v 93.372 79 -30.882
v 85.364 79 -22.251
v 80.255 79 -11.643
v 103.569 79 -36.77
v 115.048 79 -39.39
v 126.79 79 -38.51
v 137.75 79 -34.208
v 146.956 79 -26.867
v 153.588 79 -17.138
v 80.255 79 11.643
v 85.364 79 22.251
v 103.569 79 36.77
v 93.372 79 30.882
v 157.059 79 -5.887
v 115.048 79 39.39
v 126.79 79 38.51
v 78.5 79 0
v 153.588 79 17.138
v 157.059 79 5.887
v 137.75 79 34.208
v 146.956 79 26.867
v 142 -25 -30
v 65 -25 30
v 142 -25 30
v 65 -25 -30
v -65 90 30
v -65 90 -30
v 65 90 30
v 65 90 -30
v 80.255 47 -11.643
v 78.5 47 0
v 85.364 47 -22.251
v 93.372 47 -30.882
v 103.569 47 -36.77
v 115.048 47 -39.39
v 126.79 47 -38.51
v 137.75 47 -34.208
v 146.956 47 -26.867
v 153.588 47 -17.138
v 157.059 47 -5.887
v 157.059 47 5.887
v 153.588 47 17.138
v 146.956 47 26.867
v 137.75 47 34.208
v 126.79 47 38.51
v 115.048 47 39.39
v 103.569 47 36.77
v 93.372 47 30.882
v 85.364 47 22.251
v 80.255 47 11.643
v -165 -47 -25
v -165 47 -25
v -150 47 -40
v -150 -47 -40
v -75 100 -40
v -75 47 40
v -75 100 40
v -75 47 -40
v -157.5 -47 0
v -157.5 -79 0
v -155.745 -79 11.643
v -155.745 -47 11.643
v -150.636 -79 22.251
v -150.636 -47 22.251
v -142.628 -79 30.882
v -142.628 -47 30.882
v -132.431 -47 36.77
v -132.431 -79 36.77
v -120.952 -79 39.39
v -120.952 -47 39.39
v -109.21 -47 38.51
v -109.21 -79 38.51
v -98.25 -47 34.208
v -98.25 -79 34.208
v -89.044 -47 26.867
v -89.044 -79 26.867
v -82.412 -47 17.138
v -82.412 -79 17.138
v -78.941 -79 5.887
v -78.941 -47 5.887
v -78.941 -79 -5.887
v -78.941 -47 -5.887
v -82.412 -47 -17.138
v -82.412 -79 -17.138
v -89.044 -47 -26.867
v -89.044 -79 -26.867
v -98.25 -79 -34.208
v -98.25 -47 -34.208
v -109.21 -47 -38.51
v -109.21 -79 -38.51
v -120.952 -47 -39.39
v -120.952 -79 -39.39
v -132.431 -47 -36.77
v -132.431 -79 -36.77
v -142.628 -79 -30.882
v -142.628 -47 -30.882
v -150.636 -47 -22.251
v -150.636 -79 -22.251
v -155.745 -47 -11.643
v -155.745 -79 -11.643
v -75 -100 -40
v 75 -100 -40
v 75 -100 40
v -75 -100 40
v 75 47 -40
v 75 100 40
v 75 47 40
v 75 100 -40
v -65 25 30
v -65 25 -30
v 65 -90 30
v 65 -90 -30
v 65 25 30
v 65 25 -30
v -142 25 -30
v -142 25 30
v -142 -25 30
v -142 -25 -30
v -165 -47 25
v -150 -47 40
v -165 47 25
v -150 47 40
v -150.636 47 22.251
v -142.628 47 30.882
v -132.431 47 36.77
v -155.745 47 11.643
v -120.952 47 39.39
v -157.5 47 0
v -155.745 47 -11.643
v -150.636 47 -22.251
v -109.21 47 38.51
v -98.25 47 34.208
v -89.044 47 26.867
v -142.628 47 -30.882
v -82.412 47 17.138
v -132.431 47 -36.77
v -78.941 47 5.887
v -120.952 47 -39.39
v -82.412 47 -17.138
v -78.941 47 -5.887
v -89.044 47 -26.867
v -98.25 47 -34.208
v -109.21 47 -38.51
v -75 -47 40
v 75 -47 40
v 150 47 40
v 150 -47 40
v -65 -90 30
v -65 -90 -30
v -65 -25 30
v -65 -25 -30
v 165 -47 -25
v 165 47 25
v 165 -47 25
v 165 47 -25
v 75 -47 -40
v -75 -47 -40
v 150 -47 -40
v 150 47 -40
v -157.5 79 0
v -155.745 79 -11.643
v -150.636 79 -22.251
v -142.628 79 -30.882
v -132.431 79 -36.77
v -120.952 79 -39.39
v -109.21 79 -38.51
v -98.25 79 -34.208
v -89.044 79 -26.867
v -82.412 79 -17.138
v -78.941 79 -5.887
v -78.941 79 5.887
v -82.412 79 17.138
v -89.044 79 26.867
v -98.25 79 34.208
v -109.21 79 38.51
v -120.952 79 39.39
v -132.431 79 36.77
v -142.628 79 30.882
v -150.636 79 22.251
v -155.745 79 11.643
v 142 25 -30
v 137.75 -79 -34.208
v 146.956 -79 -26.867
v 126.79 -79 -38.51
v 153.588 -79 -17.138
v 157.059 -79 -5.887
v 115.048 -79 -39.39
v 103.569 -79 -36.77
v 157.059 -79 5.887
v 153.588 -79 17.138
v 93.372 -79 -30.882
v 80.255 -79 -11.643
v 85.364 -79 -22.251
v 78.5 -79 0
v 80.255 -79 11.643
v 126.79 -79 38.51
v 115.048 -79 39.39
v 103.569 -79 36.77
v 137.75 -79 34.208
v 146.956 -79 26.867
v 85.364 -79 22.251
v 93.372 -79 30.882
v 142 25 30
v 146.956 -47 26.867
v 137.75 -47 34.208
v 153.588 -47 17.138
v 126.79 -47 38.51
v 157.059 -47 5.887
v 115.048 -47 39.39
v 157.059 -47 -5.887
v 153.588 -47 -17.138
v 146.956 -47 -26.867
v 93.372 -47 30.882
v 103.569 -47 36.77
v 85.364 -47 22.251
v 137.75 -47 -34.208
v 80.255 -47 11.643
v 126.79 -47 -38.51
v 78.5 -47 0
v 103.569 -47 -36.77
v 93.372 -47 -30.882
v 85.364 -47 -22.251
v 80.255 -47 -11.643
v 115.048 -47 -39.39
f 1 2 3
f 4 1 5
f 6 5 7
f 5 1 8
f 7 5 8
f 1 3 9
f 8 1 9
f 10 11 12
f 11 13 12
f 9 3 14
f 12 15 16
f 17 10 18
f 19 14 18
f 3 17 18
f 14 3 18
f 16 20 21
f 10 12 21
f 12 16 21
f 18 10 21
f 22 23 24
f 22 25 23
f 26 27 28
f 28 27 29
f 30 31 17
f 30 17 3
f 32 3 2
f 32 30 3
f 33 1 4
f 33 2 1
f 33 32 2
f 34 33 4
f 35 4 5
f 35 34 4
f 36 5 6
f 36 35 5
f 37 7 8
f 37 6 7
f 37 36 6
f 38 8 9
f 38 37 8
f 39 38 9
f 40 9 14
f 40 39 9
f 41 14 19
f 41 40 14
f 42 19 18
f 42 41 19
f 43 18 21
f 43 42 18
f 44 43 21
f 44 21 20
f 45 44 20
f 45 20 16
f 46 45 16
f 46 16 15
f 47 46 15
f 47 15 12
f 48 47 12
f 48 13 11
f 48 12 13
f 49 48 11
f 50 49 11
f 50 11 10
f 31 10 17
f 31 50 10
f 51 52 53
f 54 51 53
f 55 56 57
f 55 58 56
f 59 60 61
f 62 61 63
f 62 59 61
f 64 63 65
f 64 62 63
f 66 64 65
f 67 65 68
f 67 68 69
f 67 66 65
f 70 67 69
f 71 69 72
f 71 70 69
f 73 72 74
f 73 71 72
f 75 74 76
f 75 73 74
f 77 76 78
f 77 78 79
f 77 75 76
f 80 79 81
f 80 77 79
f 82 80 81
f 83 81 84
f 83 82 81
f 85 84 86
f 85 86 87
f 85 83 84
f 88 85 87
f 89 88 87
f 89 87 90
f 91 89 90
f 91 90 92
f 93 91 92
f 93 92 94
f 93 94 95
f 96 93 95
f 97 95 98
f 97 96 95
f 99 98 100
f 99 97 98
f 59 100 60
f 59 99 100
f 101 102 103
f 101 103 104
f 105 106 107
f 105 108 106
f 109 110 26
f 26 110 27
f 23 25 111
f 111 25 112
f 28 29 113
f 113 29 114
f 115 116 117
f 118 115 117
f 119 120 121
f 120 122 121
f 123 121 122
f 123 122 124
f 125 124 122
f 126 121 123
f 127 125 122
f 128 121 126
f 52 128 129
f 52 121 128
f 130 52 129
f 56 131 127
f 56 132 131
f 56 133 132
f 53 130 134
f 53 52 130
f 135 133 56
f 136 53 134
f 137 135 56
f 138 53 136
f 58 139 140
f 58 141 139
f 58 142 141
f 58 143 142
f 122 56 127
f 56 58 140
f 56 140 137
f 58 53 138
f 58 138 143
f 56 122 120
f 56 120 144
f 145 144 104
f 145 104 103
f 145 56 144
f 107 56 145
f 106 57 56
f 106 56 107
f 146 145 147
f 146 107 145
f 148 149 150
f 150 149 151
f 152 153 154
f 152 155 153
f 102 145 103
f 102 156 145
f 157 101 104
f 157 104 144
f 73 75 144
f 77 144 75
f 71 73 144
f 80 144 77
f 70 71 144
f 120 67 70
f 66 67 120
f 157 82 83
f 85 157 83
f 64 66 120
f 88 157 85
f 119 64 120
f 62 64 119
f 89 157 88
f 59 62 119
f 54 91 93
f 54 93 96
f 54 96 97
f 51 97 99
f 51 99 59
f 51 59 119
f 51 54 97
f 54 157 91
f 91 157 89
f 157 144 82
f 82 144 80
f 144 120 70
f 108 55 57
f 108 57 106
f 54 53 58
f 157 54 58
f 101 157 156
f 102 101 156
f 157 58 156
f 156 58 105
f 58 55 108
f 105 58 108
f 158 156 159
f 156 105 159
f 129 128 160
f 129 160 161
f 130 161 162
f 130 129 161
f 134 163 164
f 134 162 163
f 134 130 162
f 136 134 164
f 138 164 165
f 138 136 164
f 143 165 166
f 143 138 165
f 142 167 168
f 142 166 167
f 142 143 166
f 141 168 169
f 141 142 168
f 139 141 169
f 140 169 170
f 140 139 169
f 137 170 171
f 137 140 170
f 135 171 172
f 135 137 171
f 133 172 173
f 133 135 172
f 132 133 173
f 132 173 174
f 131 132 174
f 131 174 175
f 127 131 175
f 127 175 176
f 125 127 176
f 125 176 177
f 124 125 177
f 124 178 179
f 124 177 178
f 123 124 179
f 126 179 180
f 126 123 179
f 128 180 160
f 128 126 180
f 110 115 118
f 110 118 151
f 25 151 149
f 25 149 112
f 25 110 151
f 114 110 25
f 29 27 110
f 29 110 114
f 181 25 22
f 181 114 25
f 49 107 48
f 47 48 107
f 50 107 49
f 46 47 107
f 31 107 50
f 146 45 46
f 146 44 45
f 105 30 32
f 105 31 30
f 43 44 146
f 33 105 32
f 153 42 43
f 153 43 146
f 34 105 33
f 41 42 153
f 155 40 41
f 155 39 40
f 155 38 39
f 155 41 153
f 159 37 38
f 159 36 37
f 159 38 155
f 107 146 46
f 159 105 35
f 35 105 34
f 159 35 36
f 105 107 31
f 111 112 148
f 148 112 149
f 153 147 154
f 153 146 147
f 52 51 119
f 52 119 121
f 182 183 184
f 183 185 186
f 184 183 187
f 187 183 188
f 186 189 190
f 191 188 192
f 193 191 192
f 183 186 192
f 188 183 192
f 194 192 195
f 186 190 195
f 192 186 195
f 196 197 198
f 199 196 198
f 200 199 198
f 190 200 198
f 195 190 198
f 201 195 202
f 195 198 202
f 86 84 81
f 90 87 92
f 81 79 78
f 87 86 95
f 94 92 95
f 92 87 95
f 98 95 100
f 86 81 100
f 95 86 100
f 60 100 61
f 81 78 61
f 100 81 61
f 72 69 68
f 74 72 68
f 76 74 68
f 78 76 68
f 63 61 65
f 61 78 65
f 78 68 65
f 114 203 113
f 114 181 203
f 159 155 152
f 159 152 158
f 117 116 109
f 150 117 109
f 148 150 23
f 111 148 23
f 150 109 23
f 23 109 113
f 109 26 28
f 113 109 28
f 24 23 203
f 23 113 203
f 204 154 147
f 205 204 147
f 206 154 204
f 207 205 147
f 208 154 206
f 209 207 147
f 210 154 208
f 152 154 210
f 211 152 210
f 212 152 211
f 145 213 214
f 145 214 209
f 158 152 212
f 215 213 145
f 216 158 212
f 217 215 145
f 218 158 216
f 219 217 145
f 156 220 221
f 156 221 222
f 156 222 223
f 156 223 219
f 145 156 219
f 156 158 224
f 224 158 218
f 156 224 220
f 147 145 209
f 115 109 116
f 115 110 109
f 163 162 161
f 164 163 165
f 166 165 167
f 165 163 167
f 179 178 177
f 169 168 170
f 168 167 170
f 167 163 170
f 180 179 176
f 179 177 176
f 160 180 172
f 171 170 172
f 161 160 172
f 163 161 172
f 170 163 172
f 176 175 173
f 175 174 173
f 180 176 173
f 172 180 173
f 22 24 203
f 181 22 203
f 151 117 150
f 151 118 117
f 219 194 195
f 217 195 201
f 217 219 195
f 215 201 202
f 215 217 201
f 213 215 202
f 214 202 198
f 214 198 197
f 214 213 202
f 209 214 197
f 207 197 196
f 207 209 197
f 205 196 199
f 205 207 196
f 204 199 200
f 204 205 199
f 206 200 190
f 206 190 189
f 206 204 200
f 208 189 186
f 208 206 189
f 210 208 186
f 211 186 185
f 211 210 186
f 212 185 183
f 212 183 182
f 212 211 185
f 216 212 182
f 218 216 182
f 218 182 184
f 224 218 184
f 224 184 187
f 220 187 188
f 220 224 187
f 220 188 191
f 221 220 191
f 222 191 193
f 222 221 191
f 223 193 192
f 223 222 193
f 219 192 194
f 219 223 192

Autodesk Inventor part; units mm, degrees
ref_plane "YZ Plane" through (0, 0, 0) normal (1, 0, 0) x (0, 1, 0)
ref_plane "XZ Plane" through (0, 0, 0) normal (0, 1, 0) x (-1, 0, 0)
ref_plane "XY Plane" through (0, 0, 0) normal (0, 0, 1) x (1, 0, 0)
sketch "Sketch4" plane through (0, 0, 0) normal (0, 0, 1) x (1, 0, 0)
  line L0 (75, -100) -> (-75, -100)
  line L1 (-75, -100) -> (-75, 100)
  line L2 (-75, 100) -> (75, 100)
  line L3 (75, 100) -> (75, -100)
  line L4 (75, -100) -> (-75, 100) construction
  line L5 (-75, -100) -> (75, 100) construction
  line L6 (165, -47) -> (-165, -47)
  line L7 (-165, -47) -> (-165, 47)
  line L8 (-165, 47) -> (165, 47)
  line L9 (165, 47) -> (165, -47)
  line L10 (165, -47) -> (-165, 47) construction
  line L11 (-165, -47) -> (165, 47) construction
  point P0 (0, 0)
  point P1 (0, 0)
  point P2 (0, 0)
  point P3 (75, 47)
  point P4 (-75, 47)
  point P5 (-75, -47)
  point P6 (75, -47)
  dimension "d17" = 94
  dimension "d18" = 330
  dimension "d19" = 150
  dimension "d20" = 200
extrude "Extrusion4" add sketch "Sketch4" along normal mid plane 80
sketch "Sketch5" plane through (0, 0, 0) normal (0, 1, 0) x (-1, 0, 0)
  circle A0 centre (-118, 0) radius 39.5
  circle A1 centre (118, 0) radius 39.5
  line L0 (75, 40) -> (-75, 40) construction
  line L1 (0, 40) -> (0, -40) construction
  line L2 (-75, -40) -> (75, -40) construction
  line L3 (-165, -40) -> (-165, 40) construction
  line L4 (-165, 0) -> (165, 0) construction
  line L5 (165, -40) -> (165, 40) construction
  circle A2 centre (-118, 0) radius 31.5
  circle A3 centre (118, 0) radius 31.5
  line L6 (-150, 40) -> (-165, 25)
  line L7 (-165, -25) -> (-150, -40)
  line L8 (-165, -40) -> (-75, -40) projected
  line L9 (165, 40) -> (75, 40) projected
  line L10 (150, 40) -> (165, 25)
  line L11 (165, -25) -> (150, -40)
  line L12 (-75, 40) -> (-165, 40) projected
  line L13 (75, -40) -> (165, -40) projected
  line L14 (-165, 40) -> (-165, -40)
  line L15 (165, 40) -> (165, -40)
  point P0 (0, 0)
  dimension "d23" = 79
  dimension "d24" = 236
  dimension "d39" = 63
  dimension "d42" = 15
  dimension "d43" = 45
extrude "Extrusion5" add sketch "Sketch5" against normal blind 32 from surface at -47 contours A0 | A1 | A2 | A3
sketch "Sketch6" plane through (0, 0, 0) normal (0, 0, 1) x (1, 0, 0)
  line L0 (142, 25) -> (-142, 25)
  line L1 (-142, 25) -> (-142, -25)
  line L2 (-142, -25) -> (142, -25)
  line L3 (142, -25) -> (142, 25)
  line L4 (142, 25) -> (-142, -25) construction
  line L5 (-142, 25) -> (142, -25) construction
  line L6 (-65, 90) -> (65, 90)
  line L7 (65, 90) -> (65, -90)
  line L8 (65, -90) -> (-65, -90)
  line L9 (-65, -90) -> (-65, 90)
  line L10 (-65, 90) -> (65, -90) construction
  line L11 (65, 90) -> (-65, -90) construction
  line L12 (75, -100) -> (-75, -100) projected
  line L13 (-75, 47) -> (-75, 100) projected
  line L14 (-165, -47) -> (-165, 47) projected
  line L15 (-75, -47) -> (-165, -47) projected
  point P0 (0, 0)
  point P1 (-65, -25)
  point P2 (65, -25)
  point P3 (65, 25)
  point P4 (-65, 25)
  dimension "d27" = 10
  dimension "d28" = 10
  dimension "d29" = 23
  dimension "d30" = 22
extrude "Extrusion6" cut sketch "Sketch6" along normal mid plane 60
extrude "Extrusion8" cut sketch "Sketch5" against normal through all both and the other way through all contours L7 L8 L14 | L6 L14 L12 | L15 L10 L9 | L15 L13 L11
mirror "Mirror1" about plane through (0, 0, 0) normal (0, 1, 0) of "Extrusion5"
properties part number "body_inventor"
